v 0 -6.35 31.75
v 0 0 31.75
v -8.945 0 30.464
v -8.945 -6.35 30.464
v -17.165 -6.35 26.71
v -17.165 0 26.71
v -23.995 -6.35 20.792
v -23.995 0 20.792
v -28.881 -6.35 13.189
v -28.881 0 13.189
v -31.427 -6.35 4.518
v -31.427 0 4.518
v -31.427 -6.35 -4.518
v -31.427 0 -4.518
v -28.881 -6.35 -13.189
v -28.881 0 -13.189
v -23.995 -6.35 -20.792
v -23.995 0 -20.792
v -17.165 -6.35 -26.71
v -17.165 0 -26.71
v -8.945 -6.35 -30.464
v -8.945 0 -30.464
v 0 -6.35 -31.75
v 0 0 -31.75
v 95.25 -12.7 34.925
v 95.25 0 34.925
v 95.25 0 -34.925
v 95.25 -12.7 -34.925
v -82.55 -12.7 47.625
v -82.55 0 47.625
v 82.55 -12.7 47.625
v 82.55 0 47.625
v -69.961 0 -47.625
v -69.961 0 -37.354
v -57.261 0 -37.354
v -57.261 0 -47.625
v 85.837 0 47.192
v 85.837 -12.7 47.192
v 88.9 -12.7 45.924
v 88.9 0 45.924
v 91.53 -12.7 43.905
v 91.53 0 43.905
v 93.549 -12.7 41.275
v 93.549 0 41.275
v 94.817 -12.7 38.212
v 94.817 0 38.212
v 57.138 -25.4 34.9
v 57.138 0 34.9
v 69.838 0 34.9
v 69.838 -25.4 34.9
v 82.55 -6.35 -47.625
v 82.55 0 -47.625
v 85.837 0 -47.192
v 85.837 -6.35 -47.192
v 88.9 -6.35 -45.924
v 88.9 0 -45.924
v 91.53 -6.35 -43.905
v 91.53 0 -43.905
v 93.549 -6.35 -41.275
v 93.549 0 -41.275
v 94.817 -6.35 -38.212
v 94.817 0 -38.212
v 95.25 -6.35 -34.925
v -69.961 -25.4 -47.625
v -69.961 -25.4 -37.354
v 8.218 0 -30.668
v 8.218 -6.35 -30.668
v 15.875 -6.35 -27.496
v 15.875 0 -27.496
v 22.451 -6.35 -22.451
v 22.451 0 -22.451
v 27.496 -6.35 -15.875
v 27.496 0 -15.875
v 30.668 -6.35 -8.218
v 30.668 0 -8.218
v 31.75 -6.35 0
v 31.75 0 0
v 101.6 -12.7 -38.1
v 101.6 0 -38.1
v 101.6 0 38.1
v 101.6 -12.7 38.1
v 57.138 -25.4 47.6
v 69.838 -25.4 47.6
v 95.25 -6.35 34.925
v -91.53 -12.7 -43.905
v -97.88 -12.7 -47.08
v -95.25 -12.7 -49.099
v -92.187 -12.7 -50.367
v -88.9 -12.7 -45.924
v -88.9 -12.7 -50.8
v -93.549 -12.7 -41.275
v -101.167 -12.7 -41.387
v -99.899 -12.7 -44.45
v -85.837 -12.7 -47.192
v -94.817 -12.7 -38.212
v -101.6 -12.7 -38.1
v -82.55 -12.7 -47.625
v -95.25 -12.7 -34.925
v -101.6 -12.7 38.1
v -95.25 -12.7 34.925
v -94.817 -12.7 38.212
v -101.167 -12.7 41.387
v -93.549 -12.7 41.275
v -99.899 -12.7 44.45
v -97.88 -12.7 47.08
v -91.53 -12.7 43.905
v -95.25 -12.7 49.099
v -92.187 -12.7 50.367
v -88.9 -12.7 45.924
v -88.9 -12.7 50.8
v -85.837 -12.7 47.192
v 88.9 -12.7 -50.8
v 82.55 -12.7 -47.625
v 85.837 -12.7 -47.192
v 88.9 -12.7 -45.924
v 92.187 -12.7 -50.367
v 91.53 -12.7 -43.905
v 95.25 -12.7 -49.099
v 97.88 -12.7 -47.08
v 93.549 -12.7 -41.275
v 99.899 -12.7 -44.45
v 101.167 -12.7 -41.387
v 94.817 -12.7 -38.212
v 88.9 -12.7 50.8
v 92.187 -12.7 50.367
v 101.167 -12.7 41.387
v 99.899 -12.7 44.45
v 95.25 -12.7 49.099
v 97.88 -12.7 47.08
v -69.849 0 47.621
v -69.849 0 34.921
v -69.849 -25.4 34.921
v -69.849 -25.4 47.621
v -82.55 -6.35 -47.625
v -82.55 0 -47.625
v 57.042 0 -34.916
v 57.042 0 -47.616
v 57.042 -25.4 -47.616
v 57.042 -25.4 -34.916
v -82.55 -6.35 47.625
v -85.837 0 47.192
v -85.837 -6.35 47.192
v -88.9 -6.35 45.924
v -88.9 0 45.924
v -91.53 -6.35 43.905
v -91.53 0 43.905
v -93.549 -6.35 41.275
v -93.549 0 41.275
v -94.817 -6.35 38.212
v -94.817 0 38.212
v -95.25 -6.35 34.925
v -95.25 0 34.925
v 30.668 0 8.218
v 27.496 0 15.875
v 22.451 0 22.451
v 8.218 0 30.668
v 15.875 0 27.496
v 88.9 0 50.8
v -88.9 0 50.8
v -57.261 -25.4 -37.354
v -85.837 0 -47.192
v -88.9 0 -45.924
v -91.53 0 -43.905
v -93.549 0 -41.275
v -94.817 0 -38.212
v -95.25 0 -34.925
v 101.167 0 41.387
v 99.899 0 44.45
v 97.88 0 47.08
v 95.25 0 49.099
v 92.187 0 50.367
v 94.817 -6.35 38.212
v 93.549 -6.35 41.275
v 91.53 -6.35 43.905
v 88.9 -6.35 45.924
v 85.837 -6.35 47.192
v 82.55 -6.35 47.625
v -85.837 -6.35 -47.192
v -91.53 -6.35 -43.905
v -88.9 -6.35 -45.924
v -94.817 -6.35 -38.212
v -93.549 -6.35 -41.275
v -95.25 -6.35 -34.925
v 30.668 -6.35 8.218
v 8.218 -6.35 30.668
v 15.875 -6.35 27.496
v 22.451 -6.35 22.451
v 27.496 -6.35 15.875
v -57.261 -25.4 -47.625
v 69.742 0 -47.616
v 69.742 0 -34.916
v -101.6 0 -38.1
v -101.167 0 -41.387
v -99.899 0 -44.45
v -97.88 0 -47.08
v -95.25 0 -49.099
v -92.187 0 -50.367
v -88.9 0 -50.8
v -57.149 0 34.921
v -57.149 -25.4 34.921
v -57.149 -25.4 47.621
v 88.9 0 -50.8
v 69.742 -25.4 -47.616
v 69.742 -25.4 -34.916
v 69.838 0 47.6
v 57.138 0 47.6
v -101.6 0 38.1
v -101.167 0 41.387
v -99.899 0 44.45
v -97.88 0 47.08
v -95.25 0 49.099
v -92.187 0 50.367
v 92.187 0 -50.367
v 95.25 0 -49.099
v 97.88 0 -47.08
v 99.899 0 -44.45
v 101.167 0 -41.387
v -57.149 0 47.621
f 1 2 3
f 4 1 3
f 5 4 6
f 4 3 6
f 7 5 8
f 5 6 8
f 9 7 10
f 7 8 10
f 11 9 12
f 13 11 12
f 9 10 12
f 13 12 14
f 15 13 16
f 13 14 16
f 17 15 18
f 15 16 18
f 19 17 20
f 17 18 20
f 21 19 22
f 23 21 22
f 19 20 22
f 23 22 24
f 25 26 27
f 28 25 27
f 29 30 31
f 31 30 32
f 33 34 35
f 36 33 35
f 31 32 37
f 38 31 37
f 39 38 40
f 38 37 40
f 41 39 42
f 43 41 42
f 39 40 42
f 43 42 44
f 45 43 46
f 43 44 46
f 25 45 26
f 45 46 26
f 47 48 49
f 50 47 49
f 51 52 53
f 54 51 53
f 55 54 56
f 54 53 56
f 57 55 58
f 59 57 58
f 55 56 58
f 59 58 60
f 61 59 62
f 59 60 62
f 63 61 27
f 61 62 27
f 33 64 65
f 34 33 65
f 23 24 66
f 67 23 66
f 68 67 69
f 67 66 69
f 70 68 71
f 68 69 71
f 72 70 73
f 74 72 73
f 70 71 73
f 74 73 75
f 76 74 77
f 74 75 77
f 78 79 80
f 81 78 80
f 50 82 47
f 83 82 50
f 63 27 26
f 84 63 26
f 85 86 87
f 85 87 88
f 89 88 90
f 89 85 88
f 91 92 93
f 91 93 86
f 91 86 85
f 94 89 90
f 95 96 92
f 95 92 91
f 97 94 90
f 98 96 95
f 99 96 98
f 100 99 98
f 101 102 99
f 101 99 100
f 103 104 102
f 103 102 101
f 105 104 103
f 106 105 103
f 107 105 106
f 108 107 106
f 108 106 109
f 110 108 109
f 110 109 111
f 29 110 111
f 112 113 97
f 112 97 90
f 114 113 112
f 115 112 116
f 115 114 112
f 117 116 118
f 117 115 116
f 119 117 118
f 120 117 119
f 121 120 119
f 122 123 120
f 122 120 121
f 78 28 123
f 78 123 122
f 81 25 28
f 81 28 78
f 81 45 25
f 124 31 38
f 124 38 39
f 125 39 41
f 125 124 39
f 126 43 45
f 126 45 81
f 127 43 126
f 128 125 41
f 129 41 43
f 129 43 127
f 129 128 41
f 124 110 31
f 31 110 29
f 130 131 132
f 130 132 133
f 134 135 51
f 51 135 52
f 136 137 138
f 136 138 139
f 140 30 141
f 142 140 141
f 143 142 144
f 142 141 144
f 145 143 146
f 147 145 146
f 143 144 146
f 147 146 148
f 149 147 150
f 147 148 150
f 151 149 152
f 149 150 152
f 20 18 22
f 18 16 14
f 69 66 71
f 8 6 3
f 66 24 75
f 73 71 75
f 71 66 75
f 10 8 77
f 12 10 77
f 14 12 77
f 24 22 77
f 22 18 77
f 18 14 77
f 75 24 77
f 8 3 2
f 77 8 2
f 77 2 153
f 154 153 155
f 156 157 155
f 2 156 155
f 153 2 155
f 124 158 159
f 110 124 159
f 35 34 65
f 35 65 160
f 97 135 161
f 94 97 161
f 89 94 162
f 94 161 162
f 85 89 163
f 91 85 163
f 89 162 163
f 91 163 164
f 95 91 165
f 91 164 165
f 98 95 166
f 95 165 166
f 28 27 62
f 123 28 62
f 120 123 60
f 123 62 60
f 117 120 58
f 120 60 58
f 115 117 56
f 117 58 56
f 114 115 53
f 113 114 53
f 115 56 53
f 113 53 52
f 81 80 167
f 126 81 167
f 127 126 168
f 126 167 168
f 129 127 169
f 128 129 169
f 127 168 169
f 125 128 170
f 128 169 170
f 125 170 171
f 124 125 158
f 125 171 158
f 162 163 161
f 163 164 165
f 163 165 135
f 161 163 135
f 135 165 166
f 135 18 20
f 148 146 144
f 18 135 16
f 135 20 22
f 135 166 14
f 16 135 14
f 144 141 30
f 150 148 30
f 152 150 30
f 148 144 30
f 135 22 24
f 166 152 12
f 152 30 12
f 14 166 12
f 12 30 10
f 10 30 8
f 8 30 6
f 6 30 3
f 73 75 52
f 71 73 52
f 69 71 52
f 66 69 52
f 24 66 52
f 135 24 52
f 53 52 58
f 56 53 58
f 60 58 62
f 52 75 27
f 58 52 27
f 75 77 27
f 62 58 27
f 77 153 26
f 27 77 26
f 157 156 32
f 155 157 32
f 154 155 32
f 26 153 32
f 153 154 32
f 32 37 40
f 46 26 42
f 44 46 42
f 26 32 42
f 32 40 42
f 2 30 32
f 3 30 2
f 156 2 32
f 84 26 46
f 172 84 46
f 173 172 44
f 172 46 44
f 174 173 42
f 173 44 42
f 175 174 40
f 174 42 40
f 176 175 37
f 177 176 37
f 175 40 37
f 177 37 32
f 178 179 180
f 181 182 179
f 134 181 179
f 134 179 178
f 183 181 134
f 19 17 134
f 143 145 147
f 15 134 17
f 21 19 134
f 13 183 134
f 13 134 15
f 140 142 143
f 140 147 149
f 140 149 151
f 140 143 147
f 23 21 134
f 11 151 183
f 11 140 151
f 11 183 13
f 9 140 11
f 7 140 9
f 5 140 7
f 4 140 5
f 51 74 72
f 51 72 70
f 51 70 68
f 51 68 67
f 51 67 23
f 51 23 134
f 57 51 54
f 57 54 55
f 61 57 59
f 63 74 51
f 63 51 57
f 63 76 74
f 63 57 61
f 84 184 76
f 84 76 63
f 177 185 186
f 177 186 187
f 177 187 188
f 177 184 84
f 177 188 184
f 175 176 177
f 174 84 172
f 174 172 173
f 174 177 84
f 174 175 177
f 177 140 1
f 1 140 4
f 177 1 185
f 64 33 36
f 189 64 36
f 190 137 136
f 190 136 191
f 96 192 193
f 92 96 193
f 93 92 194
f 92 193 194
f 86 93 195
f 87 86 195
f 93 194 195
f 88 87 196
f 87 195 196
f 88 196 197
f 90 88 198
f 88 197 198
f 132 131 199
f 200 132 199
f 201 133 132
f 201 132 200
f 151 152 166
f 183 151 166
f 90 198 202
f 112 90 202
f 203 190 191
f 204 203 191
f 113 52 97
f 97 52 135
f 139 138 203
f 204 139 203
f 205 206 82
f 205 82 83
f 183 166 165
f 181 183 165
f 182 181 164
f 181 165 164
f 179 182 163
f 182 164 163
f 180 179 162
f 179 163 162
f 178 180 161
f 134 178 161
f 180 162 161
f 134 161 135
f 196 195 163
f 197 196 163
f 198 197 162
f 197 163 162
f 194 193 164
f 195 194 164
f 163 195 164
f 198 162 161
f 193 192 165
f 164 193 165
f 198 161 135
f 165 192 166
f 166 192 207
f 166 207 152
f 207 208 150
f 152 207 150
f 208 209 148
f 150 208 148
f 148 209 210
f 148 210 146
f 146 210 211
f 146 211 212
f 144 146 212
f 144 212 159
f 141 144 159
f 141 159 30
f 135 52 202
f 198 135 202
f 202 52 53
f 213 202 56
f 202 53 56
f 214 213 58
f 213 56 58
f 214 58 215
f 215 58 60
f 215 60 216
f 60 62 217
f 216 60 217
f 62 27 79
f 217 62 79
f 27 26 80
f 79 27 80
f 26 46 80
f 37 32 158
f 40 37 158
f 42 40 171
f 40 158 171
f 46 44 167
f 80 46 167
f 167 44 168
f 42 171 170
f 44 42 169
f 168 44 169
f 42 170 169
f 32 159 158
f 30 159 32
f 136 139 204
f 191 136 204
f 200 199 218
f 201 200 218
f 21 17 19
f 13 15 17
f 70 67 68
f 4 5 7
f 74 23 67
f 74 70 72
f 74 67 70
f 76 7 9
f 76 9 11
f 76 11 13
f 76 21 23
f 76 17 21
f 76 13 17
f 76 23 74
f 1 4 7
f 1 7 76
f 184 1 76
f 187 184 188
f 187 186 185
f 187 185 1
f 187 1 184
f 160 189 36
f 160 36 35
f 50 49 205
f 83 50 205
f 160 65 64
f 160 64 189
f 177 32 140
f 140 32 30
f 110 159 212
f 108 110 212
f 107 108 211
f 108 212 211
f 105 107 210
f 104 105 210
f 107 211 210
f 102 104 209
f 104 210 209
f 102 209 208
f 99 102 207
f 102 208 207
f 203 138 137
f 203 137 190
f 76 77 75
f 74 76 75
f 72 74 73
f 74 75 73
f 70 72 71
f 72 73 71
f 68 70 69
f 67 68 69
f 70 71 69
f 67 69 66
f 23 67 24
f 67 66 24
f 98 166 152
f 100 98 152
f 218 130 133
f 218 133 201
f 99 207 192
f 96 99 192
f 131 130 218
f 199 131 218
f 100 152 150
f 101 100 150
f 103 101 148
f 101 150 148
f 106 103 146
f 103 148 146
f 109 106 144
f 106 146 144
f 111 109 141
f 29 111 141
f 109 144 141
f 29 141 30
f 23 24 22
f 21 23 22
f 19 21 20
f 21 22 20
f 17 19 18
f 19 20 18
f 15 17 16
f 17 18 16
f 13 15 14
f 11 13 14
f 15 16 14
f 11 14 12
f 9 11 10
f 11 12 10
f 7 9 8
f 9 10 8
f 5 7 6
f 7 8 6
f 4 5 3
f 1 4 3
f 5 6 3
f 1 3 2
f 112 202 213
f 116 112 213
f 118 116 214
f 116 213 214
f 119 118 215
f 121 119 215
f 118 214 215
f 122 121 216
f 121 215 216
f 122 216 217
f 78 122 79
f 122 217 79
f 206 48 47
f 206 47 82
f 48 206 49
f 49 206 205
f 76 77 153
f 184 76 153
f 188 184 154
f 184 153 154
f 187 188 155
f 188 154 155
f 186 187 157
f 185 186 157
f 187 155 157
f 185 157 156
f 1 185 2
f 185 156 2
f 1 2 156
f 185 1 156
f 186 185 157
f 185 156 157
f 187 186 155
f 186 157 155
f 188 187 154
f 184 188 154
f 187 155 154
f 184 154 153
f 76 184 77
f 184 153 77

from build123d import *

# Parameters (mm, degrees)
F1_DEPTH = 6.35
F2_DEPTH = 12.7
F3_DEPTH = 6.35
F4_W     = 12.7
F4_H     = 10.270933032
F5_DEPTH = 25.4
F4_H_2   = 12.7


with BuildPart() as f1:
    # F0 (on Front) → F1 (new body)
    with BuildSketch(Plane.XZ):
        with BuildLine():
            Line((0, -47.625), (82.55, -47.625))
            ThreePointArc((82.55, -47.625), (91.5302561211, -43.9052561211), (95.25, -34.925))
            Line((95.25, -34.925), (95.25, 34.925))
            ThreePointArc((95.25, 34.925), (91.5302561211, 43.9052561211), (82.55, 47.625))
            Line((82.55, 47.625), (0, 47.625))
            Line((0, 47.625), (0, 31.75))
            ThreePointArc((0, 31.75), (22.4506403027, 22.4506403027), (31.75, 0))
            ThreePointArc((31.75, 0), (22.4506403027, -22.4506403027), (0, -31.75))
            Line((0, -31.75), (0, -47.625))
        make_face()
        with BuildLine():
            Line((-82.55, -47.625), (0, -47.625))
            Line((0, -47.625), (0, -31.75))
            ThreePointArc((0, -31.75), (-31.75, 0), (0, 31.75))
            Line((0, 31.75), (0, 47.625))
            Line((0, 47.625), (-82.55, 47.625))
            ThreePointArc((-82.55, 47.625), (-91.5302561211, 43.9052561211), (-95.25, 34.925))
            Line((-95.25, 34.925), (-95.25, -34.925))
            ThreePointArc((-95.25, -34.925), (-91.5302561211, -43.9052561211), (-82.55, -47.625))
        make_face()
    extrude(amount=F1_DEPTH)


with BuildPart() as f2:
    # F0 (on Front) → F2 (new body)
    with BuildSketch(Plane.XZ):
        with BuildLine():
            Line((-88.9, -50.8), (88.9, -50.8))
            ThreePointArc((88.9, -50.8), (97.8802561211, -47.0802561211), (101.6, -38.1))
            Line((101.6, -38.1), (101.6, 38.1))
            ThreePointArc((101.6, 38.1), (97.8802561211, 47.0802561211), (88.9, 50.8))
            Line((88.9, 50.8), (-88.9, 50.8))
            ThreePointArc((-88.9, 50.8), (-97.8802561211, 47.0802561211), (-101.6, 38.1))
            Line((-101.6, 38.1), (-101.6, -38.1))
            ThreePointArc((-101.6, -38.1), (-97.8802561211, -47.0802561211), (-88.9, -50.8))
        make_face()
        with BuildLine():
            ThreePointArc((95.25, -34.925), (91.5302561211, -43.9052561211), (82.55, -47.625))
            Line((82.55, -47.625), (0, -47.625))
            Line((0, -47.625), (-82.55, -47.625))
            ThreePointArc((-82.55, -47.625), (-91.5302561211, -43.9052561211), (-95.25, -34.925))
            Line((-95.25, -34.925), (-95.25, 34.925))
            ThreePointArc((-95.25, 34.925), (-91.5302561211, 43.9052561211), (-82.55, 47.625))
            Line((-82.55, 47.625), (0, 47.625))
            Line((0, 47.625), (82.55, 47.625))
            ThreePointArc((82.55, 47.625), (91.5302561211, 43.9052561211), (95.25, 34.925))
            Line((95.25, 34.925), (95.25, -34.925))
        make_face(mode=Mode.SUBTRACT)
    extrude(amount=F2_DEPTH)


with BuildPart() as f3:
    # F0 (on Front) → F3 (new body)
    with BuildSketch(Plane.XZ):
        with BuildLine():
            ThreePointArc((0, 31.75), (-31.75, 0), (0, -31.75))
            Line((0, -31.75), (0, 31.75))
        make_face()
        with BuildLine():
            Line((0, 31.75), (0, -31.75))
            ThreePointArc((0, -31.75), (22.4506403027, -22.4506403027), (31.75, 0))
            ThreePointArc((31.75, 0), (22.4506403027, 22.4506403027), (0, 31.75))
        make_face()
    extrude(amount=F3_DEPTH)


with BuildPart() as f5:
    # F4 (on face) → F5 (new body)
    with BuildSketch(Plane.XZ):
        with Locations((-63.6109358191, -42.489533484)):
            Rectangle(F4_W, F4_H)
    extrude(amount=F5_DEPTH)


with BuildPart() as f5b:
    # F4 (on face) → F5, piece 2 (new body)
    with BuildSketch(Plane.XZ):
        with Locations((63.4876383305, 41.2499686539)):
            Rectangle(F4_W, F4_H_2)
    extrude(amount=F5_DEPTH)


with BuildPart() as f5c:
    # F4 (on face) → F5, piece 3 (new body)
    with BuildSketch(Plane.XZ):
        with Locations((63.3915146649, -41.2662359118)):
            Rectangle(F4_W, F4_H_2)
    extrude(amount=F5_DEPTH)


with BuildPart() as f5d:
    # F4 (on face) → F5, piece 4 (new body)
    with BuildSketch(Plane.XZ):
        with Locations((-63.4990579009, 41.2708999753)):
            Rectangle(F4_W, F4_H_2)
    extrude(amount=F5_DEPTH)


solid = Compound([f1.part, f2.part, f3.part, f5.part, f5b.part, f5c.part, f5d.part])
